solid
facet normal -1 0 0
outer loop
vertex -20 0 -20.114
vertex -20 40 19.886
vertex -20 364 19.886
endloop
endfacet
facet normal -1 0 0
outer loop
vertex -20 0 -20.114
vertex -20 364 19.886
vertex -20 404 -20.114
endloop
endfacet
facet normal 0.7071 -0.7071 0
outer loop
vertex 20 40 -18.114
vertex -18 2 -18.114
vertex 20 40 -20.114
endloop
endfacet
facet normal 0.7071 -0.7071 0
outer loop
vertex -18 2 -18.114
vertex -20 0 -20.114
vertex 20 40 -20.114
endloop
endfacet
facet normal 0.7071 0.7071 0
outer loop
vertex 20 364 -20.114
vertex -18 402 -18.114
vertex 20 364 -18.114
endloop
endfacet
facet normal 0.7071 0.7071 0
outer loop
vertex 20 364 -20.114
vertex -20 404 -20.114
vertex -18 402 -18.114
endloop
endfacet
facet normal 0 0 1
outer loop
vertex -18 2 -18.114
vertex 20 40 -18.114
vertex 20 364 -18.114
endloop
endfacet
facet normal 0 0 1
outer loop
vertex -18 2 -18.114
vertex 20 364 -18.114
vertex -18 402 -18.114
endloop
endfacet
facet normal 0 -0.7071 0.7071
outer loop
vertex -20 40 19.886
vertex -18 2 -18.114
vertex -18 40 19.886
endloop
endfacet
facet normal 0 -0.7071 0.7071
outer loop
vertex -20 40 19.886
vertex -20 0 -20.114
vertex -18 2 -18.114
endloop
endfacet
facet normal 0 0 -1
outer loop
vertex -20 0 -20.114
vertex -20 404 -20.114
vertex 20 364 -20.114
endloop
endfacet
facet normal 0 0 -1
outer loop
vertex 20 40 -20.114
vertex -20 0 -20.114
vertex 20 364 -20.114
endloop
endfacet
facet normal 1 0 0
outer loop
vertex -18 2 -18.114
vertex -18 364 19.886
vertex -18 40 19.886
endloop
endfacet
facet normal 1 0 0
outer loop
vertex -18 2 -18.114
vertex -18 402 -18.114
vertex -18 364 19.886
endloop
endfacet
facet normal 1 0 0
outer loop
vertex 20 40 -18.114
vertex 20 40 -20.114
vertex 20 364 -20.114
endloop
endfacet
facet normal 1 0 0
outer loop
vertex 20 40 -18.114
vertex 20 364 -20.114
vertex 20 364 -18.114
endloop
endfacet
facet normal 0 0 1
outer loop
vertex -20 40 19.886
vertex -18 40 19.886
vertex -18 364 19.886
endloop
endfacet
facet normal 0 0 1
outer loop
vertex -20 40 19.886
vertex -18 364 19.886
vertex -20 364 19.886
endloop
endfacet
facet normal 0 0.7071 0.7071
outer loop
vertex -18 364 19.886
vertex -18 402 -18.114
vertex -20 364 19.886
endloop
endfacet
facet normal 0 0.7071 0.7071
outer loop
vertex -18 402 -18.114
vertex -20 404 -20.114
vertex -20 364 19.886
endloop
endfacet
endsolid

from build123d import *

# Parameters (mm, degrees)
BOSS_EXTRU_1_DEPTH      = 404
ENL_V_MAT_EXTRU_1_DEPTH = 590
ENL_V_MAT_EXTRU_2_DEPTH = 590
ENL_V_MAT_EXTRU_3_DEPTH = 41
ENL_V_MAT_EXTRU_4_DEPTH = 41


with BuildPart() as part:
    # Esquisse1 → Boss.-Extru.1 (new body)
    with BuildSketch(Plane(origin=(0, 0, 0), x_dir=(1, 0, 0), z_dir=(0, 1, 0))):
        Polygon((-20, 20.113636364), (20, 20.113636364), (20, 18.113636364), (-18, 18.113636364), (-18, -19.886363636), (-20, -19.886363636), align=None)
    extrude(amount=BOSS_EXTRU_1_DEPTH)

    # Esquisse2 → Enlèv. mat.-Extru.1 (cut)
    with BuildSketch(Plane(origin=(0, 0, -20.113636364), x_dir=(-1, 0, 0), z_dir=(0, 0, -1))):
        Polygon((20, 0), (-20, 40), (-20, 0), align=None)
    extrude(amount=-ENL_V_MAT_EXTRU_1_DEPTH, mode=Mode.SUBTRACT)

    # Esquisse3 → Enlèv. mat.-Extru.2 (cut)
    with BuildSketch(Plane.ZY.offset(20)):
        Polygon((-20.113636364, 0), (19.886363636, 40), (19.886363636, 0), align=None)
    extrude(amount=-ENL_V_MAT_EXTRU_2_DEPTH, mode=Mode.SUBTRACT)

    # Esquisse4 → Enlèv. mat.-Extru.3 (cut, through all)
    with BuildSketch(Plane.ZY.offset(20)):
        Polygon((-20.113636364, 404), (19.886363636, 364), (19.886363636, 404), align=None)
    extrude(amount=-ENL_V_MAT_EXTRU_3_DEPTH, mode=Mode.SUBTRACT)

    # Esquisse5 → Enlèv. mat.-Extru.4 (cut, through all)
    with BuildSketch(Plane(origin=(0, 0, -20.113636364), x_dir=(-1, 0, 0), z_dir=(0, 0, -1))):
        Polygon((20, 404), (-20, 364), (-20, 404), align=None)
    extrude(amount=-ENL_V_MAT_EXTRU_4_DEPTH, mode=Mode.SUBTRACT)


solid = part.part
